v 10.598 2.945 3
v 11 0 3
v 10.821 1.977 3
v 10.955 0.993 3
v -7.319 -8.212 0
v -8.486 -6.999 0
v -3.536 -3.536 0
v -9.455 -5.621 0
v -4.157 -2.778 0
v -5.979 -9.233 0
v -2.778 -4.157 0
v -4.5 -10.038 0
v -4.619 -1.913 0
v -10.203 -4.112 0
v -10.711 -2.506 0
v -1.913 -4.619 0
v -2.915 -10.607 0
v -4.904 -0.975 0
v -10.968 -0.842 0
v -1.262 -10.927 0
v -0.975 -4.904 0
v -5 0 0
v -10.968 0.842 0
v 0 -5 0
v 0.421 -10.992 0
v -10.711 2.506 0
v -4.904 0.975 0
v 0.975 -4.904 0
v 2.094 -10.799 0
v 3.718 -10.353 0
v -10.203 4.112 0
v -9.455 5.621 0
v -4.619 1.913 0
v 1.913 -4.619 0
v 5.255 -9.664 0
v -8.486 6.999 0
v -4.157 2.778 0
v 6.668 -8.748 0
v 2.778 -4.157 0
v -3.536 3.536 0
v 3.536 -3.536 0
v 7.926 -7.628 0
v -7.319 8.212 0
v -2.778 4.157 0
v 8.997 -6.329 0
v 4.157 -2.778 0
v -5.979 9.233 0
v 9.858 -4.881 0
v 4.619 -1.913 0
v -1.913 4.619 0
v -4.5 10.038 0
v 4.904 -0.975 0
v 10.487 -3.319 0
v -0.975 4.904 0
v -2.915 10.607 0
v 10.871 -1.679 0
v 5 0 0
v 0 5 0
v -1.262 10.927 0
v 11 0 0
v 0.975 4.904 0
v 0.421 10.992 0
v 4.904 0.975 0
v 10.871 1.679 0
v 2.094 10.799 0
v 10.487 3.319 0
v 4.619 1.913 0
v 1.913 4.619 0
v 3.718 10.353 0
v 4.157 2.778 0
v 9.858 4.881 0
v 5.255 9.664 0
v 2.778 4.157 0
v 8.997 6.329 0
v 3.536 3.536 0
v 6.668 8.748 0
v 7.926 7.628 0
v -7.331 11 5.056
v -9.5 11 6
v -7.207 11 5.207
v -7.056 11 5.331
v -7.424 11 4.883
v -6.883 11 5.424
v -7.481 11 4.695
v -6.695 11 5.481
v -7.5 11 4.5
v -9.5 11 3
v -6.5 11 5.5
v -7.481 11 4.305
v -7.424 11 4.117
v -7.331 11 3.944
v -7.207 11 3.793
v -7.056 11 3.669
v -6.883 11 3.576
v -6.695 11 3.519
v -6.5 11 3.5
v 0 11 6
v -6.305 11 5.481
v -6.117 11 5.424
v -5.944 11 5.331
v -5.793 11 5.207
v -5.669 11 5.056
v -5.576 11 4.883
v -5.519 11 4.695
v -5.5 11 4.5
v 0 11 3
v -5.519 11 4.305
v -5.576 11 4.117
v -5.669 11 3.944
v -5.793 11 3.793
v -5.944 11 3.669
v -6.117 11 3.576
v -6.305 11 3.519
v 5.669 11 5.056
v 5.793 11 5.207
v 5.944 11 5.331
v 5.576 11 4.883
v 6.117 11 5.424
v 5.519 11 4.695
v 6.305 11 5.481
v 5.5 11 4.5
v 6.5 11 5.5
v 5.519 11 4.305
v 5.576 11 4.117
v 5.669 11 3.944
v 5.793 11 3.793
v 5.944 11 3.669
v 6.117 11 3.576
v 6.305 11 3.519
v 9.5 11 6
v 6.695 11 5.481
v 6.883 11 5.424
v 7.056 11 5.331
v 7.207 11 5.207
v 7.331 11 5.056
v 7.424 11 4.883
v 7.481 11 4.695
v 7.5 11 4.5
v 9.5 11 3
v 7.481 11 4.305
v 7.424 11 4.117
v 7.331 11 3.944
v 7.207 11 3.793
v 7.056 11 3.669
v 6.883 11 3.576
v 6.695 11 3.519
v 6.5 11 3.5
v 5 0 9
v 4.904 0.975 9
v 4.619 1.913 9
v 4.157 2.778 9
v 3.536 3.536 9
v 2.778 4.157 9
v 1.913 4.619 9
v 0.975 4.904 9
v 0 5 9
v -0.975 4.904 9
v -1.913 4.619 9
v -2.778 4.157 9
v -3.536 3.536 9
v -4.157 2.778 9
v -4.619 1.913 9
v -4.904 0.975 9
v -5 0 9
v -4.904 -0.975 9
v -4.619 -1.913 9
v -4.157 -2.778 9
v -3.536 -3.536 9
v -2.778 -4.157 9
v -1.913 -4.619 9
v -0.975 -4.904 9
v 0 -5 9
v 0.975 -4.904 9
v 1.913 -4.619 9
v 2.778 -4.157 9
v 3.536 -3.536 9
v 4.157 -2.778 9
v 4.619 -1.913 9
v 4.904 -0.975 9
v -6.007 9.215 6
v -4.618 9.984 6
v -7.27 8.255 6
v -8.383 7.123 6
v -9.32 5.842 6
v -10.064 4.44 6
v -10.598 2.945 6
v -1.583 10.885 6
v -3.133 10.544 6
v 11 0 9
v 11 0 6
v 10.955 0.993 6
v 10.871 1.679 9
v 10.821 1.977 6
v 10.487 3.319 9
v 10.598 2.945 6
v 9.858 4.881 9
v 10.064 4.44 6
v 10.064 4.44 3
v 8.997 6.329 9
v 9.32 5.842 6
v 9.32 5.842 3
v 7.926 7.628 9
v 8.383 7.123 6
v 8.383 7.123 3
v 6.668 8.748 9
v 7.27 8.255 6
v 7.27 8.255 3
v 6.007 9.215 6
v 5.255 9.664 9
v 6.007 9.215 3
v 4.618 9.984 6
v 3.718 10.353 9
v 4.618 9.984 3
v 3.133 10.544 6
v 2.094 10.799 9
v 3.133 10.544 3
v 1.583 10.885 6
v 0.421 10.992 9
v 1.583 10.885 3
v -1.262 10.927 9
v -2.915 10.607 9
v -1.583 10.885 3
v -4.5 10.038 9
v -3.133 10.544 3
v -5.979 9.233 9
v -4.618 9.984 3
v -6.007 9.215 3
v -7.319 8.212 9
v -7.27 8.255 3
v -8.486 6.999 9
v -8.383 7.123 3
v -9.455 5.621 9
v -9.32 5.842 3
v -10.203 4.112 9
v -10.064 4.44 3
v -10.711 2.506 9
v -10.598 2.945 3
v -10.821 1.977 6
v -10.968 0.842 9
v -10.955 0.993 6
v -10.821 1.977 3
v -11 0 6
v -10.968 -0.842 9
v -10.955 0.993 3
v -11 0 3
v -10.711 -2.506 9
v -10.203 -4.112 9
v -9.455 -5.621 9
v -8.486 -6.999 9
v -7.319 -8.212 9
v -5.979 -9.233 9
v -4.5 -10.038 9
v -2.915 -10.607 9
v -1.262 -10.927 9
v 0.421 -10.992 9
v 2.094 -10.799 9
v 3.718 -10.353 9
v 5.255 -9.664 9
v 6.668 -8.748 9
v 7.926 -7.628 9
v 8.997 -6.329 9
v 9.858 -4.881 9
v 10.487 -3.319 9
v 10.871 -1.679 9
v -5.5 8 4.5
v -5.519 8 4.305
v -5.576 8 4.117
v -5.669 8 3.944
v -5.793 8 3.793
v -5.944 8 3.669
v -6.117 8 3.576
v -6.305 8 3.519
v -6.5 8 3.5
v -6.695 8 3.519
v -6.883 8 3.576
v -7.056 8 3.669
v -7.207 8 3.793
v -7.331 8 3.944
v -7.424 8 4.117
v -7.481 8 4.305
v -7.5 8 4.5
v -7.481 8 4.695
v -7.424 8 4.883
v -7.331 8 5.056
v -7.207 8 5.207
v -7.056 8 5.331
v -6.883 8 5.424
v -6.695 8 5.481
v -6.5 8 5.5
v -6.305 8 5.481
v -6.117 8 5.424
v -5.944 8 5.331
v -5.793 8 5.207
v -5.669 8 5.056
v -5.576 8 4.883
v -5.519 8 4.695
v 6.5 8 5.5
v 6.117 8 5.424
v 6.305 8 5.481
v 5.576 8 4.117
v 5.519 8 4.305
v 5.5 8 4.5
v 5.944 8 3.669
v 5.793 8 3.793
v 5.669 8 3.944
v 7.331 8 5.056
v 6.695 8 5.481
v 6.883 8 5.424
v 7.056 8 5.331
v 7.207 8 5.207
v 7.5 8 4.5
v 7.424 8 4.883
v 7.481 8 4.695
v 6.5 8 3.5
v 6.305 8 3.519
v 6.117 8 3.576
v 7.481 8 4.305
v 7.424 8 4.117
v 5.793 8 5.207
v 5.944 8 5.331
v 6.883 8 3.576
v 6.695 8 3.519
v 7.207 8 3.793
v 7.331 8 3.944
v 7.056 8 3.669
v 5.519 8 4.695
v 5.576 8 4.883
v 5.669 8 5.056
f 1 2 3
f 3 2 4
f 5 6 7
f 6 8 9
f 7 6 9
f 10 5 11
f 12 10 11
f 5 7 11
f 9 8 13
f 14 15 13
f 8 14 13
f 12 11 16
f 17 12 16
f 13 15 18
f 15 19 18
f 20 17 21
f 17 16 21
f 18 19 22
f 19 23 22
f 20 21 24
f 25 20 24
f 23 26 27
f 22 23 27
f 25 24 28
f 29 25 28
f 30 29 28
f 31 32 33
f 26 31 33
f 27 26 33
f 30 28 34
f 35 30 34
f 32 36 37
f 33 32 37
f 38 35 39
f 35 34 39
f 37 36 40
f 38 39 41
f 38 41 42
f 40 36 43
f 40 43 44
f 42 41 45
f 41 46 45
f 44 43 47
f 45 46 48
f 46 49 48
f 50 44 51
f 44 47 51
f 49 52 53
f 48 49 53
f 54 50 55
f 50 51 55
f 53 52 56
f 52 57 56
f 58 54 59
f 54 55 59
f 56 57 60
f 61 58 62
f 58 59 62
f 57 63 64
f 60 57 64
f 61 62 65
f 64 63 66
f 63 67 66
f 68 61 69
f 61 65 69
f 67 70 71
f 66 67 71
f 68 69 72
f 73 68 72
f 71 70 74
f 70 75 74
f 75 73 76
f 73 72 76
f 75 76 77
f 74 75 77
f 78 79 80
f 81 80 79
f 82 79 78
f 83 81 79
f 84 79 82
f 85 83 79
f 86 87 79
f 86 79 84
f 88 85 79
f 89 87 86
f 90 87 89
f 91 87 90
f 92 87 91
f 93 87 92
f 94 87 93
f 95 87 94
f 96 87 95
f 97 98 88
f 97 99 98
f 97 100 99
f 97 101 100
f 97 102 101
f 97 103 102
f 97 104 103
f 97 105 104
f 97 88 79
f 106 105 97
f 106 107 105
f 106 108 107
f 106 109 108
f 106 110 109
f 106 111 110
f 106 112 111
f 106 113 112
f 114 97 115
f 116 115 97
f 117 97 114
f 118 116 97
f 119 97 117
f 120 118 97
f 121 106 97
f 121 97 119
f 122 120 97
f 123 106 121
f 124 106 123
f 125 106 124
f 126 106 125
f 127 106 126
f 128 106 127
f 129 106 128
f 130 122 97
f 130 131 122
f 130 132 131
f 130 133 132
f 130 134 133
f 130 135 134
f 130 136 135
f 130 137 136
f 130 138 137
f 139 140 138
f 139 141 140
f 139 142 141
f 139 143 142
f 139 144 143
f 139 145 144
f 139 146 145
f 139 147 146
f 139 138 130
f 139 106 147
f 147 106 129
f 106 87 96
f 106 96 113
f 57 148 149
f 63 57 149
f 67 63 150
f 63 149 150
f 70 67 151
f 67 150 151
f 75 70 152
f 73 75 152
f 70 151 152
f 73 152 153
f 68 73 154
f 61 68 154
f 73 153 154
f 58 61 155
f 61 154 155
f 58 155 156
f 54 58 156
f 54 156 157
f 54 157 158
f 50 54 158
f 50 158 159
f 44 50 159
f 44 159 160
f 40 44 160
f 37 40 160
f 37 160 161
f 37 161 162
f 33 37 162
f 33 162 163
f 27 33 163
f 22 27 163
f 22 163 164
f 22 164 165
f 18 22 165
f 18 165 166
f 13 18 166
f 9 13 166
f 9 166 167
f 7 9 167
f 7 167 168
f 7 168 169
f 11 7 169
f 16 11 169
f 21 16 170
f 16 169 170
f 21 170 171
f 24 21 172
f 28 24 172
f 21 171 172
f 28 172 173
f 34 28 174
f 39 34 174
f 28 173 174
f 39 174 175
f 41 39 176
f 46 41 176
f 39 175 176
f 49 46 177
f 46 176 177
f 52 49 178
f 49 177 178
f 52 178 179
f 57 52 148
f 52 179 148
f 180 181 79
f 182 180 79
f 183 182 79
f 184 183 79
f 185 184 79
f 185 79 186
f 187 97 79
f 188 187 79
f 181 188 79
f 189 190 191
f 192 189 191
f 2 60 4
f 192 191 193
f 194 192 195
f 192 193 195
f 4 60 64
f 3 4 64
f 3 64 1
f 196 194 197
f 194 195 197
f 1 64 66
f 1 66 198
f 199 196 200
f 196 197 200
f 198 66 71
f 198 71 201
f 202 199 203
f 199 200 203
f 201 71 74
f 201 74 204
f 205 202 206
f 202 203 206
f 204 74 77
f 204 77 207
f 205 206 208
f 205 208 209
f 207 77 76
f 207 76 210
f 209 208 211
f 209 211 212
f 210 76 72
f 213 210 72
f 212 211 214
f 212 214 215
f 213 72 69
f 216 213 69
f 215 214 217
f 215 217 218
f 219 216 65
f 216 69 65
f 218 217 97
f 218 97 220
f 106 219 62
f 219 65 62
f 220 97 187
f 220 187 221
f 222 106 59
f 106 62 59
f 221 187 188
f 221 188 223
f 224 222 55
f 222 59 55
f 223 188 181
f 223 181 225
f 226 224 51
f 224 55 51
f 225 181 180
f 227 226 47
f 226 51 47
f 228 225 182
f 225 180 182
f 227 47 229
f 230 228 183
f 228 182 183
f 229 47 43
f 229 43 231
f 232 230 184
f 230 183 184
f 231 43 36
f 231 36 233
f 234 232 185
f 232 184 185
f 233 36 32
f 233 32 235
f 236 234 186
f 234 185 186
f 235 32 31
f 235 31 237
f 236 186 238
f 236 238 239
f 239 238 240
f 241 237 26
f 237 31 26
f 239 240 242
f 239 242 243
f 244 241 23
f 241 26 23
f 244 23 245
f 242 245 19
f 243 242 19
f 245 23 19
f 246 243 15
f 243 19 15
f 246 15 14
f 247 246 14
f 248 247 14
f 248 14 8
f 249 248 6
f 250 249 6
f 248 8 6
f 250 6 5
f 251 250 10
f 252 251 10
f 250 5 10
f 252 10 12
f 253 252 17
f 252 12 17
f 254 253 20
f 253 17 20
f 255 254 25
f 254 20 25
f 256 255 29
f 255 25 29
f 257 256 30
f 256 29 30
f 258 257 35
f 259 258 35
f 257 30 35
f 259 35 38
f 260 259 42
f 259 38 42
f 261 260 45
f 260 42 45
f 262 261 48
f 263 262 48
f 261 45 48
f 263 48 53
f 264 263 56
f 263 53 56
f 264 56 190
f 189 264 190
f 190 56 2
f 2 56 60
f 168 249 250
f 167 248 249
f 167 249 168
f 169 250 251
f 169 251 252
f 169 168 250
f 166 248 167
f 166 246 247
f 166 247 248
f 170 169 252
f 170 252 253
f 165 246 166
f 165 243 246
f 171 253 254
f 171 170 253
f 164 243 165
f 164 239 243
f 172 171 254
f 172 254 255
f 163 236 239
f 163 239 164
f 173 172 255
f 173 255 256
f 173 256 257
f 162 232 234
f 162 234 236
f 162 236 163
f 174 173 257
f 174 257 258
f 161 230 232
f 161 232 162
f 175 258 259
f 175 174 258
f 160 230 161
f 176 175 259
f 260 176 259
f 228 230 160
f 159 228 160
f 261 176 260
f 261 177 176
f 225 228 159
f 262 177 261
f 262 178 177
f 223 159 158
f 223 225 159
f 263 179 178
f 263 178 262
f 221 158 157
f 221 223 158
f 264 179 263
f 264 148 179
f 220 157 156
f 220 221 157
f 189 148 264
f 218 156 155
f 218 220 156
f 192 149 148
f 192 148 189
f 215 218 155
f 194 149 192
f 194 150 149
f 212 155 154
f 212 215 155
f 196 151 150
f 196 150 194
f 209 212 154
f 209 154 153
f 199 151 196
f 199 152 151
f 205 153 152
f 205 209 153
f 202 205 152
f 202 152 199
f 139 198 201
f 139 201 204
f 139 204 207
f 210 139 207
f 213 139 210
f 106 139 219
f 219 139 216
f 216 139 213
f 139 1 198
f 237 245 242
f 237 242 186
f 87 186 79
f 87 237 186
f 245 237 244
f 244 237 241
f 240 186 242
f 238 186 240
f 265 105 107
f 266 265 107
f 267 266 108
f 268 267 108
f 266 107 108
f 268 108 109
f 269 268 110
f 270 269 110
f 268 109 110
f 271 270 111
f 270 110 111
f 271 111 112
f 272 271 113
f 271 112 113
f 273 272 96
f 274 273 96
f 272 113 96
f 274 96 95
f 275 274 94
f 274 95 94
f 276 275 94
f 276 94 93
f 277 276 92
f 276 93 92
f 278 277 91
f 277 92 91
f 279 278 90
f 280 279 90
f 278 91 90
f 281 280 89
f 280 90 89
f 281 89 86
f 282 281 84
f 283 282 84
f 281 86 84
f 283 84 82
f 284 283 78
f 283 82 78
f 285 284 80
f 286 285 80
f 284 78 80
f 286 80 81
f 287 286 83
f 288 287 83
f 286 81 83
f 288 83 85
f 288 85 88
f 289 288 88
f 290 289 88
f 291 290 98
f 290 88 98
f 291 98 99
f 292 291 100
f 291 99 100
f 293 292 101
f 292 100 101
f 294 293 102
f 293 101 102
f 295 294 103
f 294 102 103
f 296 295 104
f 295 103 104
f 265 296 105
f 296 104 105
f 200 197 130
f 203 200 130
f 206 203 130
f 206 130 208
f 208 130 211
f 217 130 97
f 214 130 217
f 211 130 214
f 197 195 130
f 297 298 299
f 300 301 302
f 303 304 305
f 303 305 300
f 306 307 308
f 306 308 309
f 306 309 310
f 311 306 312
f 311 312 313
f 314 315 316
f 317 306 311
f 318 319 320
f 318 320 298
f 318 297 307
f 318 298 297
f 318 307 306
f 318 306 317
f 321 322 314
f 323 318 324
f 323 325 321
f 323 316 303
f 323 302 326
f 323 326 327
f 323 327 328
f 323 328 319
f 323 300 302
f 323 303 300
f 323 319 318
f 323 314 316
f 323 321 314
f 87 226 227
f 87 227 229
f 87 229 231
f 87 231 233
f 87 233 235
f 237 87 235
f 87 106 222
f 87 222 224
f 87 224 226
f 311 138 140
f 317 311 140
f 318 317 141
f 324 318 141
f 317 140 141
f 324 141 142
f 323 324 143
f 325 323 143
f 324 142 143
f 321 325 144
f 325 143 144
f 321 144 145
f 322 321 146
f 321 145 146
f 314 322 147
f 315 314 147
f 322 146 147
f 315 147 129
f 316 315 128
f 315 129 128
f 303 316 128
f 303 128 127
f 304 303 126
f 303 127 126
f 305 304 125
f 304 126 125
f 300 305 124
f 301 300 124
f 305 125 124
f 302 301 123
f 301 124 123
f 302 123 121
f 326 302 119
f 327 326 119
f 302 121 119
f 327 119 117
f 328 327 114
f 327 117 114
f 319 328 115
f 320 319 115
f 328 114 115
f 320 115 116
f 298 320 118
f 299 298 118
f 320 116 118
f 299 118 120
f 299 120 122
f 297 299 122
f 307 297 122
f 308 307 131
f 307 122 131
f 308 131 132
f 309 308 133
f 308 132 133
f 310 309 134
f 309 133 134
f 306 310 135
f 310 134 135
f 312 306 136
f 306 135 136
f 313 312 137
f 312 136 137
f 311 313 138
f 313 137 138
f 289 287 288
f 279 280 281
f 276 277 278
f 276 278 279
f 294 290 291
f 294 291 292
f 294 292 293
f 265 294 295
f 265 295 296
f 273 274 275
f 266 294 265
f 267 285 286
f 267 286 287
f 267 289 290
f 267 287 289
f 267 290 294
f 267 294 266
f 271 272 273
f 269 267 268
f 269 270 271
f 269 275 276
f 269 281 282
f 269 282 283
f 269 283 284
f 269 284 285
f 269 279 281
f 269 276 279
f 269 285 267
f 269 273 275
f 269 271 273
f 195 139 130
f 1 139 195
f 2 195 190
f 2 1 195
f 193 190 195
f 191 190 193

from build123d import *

# Parameters (mm, degrees)
SKETCH1_R           = 11
BOSS_EXTRUDE1_DEPTH = 3
BOSS_EXTRUDE2_DEPTH = 3
SKETCH3_R           = 11
BOSS_EXTRUDE3_DEPTH = 3
SKETCH4_R           = 5
CUT_EXTRUDE1_DEPTH  = 10
SKETCH5_R           = 1
CUT_EXTRUDE2_DEPTH  = 3


with BuildPart() as part:
    # Sketch1 → Boss-Extrude1 (new body)
    with BuildSketch(Plane.XY):
        Circle(SKETCH1_R)
    extrude(amount=BOSS_EXTRUDE1_DEPTH)

    # Sketch2 → Boss-Extrude2 (add)
    with BuildSketch(Plane.XY.offset(3)):
        with BuildLine():
            Line((-11, 0), (-9.5, 11))
            Line((-9.5, 11), (9.5, 11))
            Line((9.5, 11), (11, 0))
            ThreePointArc((11, 0), (0, -11), (-11, 0))
        make_face()
    extrude(amount=BOSS_EXTRUDE2_DEPTH)

    # Sketch3 → Boss-Extrude3 (add)
    with BuildSketch(Plane.XY.offset(6)):
        Circle(SKETCH3_R)
    extrude(amount=BOSS_EXTRUDE3_DEPTH)

    # Sketch4 → Cut-Extrude1 (cut, through all)
    with BuildSketch(Plane.XY.offset(9)):
        Circle(SKETCH4_R)
    extrude(amount=-CUT_EXTRUDE1_DEPTH, mode=Mode.SUBTRACT)

    # Sketch5 → Cut-Extrude2 (cut)
    with BuildSketch(Plane(origin=(0, 11, 0), x_dir=(1, 0, 0), z_dir=(0, 1, 0))):
        with Locations((-6.5, -4.5)):
            Circle(SKETCH5_R)
        with Locations((6.5, -4.5)):
            Circle(SKETCH5_R)
    extrude(amount=-CUT_EXTRUDE2_DEPTH, mode=Mode.SUBTRACT)


solid = part.part
